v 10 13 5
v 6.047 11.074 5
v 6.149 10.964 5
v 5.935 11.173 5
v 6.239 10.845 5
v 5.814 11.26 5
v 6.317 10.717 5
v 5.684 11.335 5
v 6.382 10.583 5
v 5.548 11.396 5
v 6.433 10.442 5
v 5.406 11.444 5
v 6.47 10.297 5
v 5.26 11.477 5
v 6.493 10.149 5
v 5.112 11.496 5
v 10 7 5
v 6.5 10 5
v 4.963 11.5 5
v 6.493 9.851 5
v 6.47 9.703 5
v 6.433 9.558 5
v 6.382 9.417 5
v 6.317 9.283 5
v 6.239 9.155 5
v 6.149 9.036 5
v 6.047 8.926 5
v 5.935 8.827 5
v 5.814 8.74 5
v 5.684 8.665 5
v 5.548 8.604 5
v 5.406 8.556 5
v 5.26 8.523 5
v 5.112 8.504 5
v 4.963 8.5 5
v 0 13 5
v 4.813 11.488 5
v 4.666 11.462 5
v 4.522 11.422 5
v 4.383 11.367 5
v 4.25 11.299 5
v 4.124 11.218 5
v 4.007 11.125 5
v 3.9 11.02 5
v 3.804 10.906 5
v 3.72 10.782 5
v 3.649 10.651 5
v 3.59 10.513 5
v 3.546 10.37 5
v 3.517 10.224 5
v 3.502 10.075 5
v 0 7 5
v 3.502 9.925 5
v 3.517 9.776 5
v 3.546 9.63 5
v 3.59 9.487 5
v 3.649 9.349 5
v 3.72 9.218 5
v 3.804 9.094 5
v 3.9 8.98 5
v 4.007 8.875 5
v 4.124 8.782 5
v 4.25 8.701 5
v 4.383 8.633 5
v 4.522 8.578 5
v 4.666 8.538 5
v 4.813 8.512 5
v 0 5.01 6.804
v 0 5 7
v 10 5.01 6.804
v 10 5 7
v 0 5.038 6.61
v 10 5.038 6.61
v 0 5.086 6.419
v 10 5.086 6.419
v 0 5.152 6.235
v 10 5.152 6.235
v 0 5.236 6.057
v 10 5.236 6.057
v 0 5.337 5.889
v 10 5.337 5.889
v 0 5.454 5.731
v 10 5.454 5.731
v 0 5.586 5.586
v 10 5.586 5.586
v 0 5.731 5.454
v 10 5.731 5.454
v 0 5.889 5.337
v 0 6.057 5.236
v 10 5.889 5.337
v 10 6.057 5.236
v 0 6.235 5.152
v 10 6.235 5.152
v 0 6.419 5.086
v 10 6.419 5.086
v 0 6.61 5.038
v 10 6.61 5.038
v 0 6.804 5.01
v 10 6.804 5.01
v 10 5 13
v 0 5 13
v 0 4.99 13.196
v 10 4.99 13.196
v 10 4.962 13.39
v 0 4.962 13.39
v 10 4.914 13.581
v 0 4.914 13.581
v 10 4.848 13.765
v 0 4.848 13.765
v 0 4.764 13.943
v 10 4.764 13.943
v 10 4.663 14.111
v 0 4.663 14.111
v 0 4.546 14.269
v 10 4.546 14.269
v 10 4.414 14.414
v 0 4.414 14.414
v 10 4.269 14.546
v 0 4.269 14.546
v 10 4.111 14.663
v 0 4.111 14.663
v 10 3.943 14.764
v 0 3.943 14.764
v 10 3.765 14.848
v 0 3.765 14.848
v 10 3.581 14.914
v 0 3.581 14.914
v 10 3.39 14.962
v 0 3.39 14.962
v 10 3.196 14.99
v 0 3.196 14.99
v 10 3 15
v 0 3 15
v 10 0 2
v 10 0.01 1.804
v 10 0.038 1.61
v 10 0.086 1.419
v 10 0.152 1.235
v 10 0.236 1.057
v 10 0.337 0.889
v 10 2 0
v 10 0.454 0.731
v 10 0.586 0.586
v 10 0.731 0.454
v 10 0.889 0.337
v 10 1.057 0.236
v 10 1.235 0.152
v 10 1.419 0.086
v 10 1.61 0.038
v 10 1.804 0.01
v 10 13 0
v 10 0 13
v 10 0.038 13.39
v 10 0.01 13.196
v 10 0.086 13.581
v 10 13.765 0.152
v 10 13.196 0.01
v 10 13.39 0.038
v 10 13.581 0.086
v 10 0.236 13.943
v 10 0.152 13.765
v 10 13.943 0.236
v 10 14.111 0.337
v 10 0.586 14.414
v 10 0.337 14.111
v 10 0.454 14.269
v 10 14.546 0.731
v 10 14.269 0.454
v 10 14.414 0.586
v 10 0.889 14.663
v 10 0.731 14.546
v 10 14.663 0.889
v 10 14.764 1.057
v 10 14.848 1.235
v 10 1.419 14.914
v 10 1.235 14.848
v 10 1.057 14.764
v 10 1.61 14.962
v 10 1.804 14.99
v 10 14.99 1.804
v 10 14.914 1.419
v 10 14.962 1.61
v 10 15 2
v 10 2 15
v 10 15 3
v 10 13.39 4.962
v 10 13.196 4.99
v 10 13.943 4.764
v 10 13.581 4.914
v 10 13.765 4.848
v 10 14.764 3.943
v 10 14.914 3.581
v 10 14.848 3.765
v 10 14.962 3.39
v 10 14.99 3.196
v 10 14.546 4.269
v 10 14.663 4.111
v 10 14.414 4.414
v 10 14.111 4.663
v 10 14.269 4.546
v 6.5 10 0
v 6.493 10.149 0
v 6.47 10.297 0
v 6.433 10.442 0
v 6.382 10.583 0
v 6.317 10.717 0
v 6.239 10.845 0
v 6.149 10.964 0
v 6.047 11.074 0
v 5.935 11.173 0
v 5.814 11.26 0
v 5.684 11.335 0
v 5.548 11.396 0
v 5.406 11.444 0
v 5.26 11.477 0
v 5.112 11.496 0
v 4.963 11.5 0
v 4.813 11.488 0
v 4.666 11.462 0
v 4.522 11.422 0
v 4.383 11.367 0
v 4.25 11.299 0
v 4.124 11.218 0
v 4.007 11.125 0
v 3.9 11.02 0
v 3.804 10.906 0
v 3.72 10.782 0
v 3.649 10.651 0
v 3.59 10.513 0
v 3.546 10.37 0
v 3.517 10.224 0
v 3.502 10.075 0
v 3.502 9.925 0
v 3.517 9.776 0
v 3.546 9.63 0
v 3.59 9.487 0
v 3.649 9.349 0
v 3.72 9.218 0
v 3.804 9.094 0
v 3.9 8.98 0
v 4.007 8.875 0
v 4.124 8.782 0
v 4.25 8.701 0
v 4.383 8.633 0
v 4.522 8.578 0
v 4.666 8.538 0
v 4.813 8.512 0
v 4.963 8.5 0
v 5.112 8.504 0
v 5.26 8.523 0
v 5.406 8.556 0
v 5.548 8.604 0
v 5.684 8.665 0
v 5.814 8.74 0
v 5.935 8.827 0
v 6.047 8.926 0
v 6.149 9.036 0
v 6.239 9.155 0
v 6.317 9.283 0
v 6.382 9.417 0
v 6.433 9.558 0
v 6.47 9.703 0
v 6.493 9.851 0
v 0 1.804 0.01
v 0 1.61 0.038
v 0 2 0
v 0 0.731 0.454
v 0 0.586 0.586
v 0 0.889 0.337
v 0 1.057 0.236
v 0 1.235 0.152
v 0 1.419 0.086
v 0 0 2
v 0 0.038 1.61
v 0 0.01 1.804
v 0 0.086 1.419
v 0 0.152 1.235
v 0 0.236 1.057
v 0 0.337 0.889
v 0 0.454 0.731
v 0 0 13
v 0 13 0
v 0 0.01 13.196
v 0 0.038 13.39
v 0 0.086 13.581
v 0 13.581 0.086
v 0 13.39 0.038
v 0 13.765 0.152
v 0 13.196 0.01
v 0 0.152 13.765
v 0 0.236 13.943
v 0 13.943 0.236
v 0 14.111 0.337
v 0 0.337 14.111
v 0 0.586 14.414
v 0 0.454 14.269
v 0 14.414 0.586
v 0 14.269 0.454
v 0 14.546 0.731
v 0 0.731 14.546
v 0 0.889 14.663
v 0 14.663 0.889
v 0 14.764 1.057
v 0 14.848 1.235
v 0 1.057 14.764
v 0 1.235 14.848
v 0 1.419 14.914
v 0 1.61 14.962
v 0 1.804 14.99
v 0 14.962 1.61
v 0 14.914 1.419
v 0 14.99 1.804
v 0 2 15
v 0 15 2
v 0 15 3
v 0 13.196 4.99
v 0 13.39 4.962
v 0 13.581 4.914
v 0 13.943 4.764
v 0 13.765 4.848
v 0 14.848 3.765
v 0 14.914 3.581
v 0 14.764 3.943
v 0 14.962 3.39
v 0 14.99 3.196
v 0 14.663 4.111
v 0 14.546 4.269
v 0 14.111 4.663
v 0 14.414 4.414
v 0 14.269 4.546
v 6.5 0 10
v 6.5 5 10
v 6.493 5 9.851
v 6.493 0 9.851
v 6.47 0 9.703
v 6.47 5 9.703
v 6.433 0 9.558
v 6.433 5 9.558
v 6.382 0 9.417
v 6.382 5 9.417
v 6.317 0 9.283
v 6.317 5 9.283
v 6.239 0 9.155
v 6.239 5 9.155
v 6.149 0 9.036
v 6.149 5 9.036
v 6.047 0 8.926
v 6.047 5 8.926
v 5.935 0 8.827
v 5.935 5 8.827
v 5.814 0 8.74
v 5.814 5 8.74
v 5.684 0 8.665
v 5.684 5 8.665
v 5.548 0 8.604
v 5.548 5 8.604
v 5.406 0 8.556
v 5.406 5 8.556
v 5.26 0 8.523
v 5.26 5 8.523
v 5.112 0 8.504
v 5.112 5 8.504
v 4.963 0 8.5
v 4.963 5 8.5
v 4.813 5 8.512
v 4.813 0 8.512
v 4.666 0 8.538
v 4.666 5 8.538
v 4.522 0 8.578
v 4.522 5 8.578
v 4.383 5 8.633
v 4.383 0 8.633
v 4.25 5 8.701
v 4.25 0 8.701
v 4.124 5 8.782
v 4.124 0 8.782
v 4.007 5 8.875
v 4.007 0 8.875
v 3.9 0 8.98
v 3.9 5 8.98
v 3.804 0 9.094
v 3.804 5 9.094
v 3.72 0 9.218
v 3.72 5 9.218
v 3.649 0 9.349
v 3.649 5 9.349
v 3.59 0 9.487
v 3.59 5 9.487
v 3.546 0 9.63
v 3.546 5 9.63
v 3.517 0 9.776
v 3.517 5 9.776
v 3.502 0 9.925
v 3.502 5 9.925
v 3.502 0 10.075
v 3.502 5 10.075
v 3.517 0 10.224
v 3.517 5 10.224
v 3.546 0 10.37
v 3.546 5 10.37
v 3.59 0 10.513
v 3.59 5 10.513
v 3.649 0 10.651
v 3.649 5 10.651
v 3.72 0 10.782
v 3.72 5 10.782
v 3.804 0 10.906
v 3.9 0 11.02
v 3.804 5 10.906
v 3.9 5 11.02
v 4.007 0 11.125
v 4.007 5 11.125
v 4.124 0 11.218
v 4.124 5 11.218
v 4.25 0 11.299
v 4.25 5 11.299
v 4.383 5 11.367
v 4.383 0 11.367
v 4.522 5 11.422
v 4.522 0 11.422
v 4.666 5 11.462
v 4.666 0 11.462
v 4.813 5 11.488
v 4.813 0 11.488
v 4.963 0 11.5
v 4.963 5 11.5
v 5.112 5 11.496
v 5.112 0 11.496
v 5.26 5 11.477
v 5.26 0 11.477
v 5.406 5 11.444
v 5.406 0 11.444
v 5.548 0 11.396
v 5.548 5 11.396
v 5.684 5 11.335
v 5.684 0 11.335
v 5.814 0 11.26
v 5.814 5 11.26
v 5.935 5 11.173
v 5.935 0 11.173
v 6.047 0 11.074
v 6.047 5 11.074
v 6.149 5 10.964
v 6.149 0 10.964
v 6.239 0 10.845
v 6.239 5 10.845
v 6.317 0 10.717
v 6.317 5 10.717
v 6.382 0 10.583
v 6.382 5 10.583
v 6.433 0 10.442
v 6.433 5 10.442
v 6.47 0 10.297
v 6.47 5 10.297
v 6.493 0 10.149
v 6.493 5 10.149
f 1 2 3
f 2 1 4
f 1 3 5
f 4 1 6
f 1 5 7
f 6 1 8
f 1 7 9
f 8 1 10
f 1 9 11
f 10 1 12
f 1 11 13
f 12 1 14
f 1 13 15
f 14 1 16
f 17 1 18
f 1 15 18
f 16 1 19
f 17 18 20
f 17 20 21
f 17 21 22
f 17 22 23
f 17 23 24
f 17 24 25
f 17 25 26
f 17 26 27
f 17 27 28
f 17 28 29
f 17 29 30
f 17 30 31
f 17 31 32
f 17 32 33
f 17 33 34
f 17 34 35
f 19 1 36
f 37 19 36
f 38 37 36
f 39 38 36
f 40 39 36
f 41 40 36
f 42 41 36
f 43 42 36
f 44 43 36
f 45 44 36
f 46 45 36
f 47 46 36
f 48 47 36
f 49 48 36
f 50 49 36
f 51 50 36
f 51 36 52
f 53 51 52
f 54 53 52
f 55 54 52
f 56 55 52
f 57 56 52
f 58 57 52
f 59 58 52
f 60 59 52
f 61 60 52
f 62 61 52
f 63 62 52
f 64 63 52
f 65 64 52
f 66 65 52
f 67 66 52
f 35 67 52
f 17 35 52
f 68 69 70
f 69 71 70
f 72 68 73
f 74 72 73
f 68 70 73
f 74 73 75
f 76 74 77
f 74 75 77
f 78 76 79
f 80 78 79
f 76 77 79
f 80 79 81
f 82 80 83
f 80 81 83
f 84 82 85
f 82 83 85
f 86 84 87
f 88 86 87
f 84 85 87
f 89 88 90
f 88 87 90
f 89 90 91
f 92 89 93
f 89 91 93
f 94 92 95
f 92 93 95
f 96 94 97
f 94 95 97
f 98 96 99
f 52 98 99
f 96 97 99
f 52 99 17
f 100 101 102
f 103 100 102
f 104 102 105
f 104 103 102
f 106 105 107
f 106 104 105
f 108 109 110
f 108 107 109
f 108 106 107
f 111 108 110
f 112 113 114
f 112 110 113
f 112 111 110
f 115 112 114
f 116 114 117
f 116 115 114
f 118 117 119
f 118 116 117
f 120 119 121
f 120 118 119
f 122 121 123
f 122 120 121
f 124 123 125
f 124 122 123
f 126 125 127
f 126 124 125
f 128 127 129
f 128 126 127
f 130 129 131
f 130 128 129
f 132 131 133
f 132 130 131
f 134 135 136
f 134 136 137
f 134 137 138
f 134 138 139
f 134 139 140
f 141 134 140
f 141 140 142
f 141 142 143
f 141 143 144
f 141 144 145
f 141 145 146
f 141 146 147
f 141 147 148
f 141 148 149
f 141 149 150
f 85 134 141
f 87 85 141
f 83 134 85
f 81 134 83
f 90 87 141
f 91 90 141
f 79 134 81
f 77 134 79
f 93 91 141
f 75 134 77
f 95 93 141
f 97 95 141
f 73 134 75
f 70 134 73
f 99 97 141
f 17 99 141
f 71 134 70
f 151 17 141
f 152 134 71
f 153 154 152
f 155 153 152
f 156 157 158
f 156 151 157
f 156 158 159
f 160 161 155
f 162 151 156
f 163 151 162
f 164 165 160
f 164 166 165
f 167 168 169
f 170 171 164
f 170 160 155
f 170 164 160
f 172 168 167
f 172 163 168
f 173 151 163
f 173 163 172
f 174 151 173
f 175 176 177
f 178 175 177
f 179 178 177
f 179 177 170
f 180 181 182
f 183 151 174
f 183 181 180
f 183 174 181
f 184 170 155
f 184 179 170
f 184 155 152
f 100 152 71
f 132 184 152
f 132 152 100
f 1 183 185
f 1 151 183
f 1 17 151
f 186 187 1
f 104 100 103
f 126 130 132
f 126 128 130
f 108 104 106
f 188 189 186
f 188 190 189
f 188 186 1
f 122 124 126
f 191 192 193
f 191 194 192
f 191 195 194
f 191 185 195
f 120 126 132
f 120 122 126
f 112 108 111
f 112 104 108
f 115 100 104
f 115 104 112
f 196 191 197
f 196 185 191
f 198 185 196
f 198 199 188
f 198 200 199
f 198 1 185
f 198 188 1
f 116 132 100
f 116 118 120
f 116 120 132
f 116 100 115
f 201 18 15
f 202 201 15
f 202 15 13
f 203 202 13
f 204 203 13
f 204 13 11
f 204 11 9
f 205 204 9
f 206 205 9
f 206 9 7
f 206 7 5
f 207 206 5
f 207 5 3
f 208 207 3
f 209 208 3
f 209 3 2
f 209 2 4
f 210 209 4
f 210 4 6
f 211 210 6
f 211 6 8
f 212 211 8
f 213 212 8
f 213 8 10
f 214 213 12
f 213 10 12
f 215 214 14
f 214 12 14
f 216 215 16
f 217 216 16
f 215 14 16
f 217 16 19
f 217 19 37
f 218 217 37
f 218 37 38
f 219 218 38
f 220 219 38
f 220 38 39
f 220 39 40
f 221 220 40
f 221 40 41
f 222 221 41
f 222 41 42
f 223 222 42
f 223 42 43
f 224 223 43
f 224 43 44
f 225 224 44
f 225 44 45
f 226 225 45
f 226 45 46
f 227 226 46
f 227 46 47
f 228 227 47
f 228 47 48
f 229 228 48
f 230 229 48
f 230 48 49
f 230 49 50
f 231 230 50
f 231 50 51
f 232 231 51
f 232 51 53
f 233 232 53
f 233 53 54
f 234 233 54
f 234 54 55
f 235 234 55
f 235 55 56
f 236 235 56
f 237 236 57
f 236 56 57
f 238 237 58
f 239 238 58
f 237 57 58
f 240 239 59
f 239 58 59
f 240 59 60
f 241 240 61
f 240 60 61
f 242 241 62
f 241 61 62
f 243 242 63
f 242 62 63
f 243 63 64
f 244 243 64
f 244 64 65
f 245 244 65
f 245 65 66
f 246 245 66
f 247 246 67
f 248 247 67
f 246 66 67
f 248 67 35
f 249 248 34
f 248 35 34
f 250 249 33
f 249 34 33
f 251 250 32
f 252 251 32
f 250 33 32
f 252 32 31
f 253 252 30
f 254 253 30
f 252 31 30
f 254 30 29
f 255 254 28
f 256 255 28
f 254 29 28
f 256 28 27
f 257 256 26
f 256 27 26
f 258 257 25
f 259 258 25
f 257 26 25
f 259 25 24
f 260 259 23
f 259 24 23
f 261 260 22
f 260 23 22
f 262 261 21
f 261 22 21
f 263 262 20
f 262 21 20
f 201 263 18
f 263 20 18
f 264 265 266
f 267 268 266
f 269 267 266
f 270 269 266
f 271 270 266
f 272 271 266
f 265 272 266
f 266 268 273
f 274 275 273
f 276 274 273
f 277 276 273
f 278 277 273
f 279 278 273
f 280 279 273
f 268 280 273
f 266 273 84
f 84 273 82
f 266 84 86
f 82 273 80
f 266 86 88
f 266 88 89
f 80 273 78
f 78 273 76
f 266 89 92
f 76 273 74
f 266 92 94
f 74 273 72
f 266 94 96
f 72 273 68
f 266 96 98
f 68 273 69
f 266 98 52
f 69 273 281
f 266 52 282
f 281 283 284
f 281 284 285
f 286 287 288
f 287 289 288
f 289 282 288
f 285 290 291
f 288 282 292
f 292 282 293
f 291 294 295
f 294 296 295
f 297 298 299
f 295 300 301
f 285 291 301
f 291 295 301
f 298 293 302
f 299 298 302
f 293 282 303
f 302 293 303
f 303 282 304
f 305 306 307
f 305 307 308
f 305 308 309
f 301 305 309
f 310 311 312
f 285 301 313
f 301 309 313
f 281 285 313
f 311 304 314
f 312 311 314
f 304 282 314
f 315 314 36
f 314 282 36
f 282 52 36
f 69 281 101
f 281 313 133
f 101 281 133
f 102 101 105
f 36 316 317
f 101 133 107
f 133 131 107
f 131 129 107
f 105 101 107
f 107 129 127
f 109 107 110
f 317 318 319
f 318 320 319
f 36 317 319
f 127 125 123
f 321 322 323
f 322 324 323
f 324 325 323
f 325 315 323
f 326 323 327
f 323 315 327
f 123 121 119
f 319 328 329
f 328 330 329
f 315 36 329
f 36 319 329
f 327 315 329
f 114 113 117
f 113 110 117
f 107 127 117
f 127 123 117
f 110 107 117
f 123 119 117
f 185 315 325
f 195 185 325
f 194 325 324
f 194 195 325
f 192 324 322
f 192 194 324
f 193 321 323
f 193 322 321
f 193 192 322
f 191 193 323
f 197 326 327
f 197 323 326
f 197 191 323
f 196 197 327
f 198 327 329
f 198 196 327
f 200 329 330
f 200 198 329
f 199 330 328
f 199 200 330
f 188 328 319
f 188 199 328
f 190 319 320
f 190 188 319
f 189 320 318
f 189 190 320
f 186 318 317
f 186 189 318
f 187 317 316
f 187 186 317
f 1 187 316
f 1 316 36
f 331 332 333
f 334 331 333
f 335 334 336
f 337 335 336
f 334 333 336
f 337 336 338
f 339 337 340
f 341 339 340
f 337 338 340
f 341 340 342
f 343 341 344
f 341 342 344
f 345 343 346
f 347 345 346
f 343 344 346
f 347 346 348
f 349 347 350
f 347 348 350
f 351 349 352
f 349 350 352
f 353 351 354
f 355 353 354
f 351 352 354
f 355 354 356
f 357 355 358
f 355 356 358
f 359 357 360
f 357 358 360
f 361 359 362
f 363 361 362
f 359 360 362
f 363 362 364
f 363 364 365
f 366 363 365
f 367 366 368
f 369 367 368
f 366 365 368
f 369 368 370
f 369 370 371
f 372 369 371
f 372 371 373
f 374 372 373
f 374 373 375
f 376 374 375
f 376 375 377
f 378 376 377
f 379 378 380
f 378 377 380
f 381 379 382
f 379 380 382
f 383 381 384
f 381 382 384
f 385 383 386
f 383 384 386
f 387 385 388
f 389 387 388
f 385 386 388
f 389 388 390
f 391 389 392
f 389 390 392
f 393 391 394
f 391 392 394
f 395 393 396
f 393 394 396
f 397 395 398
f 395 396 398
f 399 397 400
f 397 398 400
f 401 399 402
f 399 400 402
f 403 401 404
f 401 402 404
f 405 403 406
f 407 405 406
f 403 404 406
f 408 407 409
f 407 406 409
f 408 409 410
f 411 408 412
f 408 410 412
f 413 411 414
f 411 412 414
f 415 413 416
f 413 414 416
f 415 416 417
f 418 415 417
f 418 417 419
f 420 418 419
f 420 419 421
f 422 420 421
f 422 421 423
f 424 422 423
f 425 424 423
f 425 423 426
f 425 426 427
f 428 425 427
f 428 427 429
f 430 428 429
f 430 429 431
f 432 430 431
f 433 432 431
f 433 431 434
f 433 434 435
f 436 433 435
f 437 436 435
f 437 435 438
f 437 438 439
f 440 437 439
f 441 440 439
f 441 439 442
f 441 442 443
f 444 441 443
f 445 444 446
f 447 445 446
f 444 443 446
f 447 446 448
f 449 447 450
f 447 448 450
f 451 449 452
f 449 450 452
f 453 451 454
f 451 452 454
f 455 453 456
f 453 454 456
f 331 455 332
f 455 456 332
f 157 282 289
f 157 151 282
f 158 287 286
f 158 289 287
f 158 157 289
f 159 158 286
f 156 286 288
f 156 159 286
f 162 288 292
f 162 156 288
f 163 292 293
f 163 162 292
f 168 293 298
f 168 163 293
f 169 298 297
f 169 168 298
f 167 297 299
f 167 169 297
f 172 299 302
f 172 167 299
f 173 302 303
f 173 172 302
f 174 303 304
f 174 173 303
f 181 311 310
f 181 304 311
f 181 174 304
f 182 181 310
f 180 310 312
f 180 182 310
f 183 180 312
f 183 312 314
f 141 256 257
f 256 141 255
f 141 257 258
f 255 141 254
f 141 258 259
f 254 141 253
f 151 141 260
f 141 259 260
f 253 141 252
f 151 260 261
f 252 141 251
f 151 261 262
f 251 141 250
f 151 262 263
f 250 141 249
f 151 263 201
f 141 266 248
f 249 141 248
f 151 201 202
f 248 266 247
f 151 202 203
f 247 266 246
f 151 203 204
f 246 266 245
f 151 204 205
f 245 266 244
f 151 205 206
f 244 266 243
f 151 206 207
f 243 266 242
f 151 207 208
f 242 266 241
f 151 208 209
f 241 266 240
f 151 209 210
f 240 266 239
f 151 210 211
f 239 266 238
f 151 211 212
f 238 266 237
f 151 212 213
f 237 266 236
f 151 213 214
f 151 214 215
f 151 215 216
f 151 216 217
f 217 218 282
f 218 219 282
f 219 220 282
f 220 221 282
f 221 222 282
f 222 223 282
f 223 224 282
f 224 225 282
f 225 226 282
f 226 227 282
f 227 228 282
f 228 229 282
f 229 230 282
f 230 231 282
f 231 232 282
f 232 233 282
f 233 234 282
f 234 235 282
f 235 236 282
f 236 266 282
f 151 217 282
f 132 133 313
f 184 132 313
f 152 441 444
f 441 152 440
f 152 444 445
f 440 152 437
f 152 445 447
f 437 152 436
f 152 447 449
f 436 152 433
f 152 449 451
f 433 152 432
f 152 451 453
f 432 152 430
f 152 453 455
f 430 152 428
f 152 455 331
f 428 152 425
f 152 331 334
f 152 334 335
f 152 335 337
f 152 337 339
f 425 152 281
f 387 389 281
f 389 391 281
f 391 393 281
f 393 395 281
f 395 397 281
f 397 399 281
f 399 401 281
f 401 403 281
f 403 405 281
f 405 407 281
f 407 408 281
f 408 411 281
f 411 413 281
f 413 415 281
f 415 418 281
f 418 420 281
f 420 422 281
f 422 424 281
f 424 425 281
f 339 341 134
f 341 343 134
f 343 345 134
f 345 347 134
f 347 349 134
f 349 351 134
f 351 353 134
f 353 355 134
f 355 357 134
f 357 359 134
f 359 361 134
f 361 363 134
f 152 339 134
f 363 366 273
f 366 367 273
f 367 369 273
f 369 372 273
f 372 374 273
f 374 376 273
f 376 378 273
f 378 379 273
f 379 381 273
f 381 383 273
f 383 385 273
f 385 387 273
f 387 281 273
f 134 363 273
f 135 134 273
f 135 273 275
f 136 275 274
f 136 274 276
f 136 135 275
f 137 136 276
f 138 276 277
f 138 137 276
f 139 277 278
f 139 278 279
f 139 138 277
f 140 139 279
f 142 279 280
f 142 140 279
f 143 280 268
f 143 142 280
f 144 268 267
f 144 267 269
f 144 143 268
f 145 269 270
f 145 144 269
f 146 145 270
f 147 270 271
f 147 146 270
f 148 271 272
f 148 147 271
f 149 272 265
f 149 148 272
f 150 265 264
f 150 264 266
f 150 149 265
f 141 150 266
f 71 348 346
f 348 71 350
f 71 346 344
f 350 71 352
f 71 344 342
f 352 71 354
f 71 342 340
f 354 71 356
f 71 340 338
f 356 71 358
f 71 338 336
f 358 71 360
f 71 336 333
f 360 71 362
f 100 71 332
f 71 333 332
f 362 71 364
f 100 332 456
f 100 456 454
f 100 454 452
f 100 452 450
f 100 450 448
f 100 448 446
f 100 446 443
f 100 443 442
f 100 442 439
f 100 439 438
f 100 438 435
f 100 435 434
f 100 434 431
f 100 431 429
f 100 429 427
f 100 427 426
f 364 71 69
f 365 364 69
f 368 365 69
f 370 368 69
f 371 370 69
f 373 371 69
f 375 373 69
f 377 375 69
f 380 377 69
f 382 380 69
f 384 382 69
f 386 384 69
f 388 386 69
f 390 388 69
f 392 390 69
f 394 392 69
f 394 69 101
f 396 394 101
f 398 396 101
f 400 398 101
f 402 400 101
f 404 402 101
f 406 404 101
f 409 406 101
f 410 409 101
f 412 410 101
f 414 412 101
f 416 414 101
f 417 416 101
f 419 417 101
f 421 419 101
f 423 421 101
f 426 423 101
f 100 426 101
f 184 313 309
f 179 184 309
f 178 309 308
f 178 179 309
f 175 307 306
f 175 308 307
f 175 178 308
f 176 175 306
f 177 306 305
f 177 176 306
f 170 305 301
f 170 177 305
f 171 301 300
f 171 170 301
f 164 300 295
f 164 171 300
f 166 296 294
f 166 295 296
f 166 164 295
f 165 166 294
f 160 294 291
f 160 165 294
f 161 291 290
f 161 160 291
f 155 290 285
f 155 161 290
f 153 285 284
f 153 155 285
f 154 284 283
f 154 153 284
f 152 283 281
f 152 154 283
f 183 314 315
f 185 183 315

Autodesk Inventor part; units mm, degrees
ref_plane "YZ Plane" through (0, 0, 0) normal (1, 0, 0) x (0, 1, 0)
ref_plane "XZ Plane" through (0, 0, 0) normal (0, 1, 0) x (-1, 0, 0)
ref_plane "XY Plane" through (0, 0, 0) normal (0, 0, 1) x (1, 0, 0)
sketch "Sketch1" plane through (0, 0, 0) normal (1, 0, 0) x (0, 1, 0)
  line L0 (0, 0) -> (5, 0)
  line L1 (5, 5) -> (5, 15)
  line L2 (5, 15) -> (0, 15)
  line L3 (0, 15) -> (0, 0)
  line L4 (0, 0) -> (15, 0)
  line L5 (15, 0) -> (15, 5)
  line L6 (15, 5) -> (5, 5)
  line L7 (0, 15) -> (0, 0)
  point P0 (2.5, 15)
  point P1 (2.5, 0)
  point P2 (0, 7.5)
  point P3 (15, 2.5)
  dimension "d0" = 15
  dimension "d2" = 10
  dimension "d3" = 10
  dimension "d4" = 15
  dimension "d5" = 5
  dimension "d6" = 10
extrude "Extrusion1" add sketch "Sketch1" along normal blind 10
fillet "Fillet1" radius 2 6 edges at (5, 5, 5) (5, 0, 0) (5, 5, 15) (5, 0, 15) (5, 15, 5) (5, 15, 0)
sketch "Sketch2" plane through (0, 5, 13) normal (0, 1, 0) x (1, 0, 0)
  circle A0 centre (5, 3) radius 1.5
  line L0 (0, 6) -> (0, 0) projected
  line L1 (0, -2) -> (10, -2) projected
  point P0 (0, 13)
  point P1 (5, -2)
  dimension "d10" = 5
  dimension "d11" = 5
  dimension "d12" = 3
sketch "Sketch3" plane through (0, 7, 5) normal (0, 0, 1) x (1, 0, 0)
  circle A0 centre (5, 3) radius 1.5
  line L0 (10, 8) -> (0, 8) projected
  line L1 (0, 6) -> (0, 0) projected
  point P0 (0, -7)
  point P1 (5, 8)
  point P2 (0, 3)
  dimension "d13" = 3
  dimension "d14" = 5
  dimension "d15" = 5
extrude "Extrusion2" cut sketch "Sketch2" against normal through all
extrude "Extrusion3" cut sketch "Sketch3" against normal through all
properties part number "L joint"
